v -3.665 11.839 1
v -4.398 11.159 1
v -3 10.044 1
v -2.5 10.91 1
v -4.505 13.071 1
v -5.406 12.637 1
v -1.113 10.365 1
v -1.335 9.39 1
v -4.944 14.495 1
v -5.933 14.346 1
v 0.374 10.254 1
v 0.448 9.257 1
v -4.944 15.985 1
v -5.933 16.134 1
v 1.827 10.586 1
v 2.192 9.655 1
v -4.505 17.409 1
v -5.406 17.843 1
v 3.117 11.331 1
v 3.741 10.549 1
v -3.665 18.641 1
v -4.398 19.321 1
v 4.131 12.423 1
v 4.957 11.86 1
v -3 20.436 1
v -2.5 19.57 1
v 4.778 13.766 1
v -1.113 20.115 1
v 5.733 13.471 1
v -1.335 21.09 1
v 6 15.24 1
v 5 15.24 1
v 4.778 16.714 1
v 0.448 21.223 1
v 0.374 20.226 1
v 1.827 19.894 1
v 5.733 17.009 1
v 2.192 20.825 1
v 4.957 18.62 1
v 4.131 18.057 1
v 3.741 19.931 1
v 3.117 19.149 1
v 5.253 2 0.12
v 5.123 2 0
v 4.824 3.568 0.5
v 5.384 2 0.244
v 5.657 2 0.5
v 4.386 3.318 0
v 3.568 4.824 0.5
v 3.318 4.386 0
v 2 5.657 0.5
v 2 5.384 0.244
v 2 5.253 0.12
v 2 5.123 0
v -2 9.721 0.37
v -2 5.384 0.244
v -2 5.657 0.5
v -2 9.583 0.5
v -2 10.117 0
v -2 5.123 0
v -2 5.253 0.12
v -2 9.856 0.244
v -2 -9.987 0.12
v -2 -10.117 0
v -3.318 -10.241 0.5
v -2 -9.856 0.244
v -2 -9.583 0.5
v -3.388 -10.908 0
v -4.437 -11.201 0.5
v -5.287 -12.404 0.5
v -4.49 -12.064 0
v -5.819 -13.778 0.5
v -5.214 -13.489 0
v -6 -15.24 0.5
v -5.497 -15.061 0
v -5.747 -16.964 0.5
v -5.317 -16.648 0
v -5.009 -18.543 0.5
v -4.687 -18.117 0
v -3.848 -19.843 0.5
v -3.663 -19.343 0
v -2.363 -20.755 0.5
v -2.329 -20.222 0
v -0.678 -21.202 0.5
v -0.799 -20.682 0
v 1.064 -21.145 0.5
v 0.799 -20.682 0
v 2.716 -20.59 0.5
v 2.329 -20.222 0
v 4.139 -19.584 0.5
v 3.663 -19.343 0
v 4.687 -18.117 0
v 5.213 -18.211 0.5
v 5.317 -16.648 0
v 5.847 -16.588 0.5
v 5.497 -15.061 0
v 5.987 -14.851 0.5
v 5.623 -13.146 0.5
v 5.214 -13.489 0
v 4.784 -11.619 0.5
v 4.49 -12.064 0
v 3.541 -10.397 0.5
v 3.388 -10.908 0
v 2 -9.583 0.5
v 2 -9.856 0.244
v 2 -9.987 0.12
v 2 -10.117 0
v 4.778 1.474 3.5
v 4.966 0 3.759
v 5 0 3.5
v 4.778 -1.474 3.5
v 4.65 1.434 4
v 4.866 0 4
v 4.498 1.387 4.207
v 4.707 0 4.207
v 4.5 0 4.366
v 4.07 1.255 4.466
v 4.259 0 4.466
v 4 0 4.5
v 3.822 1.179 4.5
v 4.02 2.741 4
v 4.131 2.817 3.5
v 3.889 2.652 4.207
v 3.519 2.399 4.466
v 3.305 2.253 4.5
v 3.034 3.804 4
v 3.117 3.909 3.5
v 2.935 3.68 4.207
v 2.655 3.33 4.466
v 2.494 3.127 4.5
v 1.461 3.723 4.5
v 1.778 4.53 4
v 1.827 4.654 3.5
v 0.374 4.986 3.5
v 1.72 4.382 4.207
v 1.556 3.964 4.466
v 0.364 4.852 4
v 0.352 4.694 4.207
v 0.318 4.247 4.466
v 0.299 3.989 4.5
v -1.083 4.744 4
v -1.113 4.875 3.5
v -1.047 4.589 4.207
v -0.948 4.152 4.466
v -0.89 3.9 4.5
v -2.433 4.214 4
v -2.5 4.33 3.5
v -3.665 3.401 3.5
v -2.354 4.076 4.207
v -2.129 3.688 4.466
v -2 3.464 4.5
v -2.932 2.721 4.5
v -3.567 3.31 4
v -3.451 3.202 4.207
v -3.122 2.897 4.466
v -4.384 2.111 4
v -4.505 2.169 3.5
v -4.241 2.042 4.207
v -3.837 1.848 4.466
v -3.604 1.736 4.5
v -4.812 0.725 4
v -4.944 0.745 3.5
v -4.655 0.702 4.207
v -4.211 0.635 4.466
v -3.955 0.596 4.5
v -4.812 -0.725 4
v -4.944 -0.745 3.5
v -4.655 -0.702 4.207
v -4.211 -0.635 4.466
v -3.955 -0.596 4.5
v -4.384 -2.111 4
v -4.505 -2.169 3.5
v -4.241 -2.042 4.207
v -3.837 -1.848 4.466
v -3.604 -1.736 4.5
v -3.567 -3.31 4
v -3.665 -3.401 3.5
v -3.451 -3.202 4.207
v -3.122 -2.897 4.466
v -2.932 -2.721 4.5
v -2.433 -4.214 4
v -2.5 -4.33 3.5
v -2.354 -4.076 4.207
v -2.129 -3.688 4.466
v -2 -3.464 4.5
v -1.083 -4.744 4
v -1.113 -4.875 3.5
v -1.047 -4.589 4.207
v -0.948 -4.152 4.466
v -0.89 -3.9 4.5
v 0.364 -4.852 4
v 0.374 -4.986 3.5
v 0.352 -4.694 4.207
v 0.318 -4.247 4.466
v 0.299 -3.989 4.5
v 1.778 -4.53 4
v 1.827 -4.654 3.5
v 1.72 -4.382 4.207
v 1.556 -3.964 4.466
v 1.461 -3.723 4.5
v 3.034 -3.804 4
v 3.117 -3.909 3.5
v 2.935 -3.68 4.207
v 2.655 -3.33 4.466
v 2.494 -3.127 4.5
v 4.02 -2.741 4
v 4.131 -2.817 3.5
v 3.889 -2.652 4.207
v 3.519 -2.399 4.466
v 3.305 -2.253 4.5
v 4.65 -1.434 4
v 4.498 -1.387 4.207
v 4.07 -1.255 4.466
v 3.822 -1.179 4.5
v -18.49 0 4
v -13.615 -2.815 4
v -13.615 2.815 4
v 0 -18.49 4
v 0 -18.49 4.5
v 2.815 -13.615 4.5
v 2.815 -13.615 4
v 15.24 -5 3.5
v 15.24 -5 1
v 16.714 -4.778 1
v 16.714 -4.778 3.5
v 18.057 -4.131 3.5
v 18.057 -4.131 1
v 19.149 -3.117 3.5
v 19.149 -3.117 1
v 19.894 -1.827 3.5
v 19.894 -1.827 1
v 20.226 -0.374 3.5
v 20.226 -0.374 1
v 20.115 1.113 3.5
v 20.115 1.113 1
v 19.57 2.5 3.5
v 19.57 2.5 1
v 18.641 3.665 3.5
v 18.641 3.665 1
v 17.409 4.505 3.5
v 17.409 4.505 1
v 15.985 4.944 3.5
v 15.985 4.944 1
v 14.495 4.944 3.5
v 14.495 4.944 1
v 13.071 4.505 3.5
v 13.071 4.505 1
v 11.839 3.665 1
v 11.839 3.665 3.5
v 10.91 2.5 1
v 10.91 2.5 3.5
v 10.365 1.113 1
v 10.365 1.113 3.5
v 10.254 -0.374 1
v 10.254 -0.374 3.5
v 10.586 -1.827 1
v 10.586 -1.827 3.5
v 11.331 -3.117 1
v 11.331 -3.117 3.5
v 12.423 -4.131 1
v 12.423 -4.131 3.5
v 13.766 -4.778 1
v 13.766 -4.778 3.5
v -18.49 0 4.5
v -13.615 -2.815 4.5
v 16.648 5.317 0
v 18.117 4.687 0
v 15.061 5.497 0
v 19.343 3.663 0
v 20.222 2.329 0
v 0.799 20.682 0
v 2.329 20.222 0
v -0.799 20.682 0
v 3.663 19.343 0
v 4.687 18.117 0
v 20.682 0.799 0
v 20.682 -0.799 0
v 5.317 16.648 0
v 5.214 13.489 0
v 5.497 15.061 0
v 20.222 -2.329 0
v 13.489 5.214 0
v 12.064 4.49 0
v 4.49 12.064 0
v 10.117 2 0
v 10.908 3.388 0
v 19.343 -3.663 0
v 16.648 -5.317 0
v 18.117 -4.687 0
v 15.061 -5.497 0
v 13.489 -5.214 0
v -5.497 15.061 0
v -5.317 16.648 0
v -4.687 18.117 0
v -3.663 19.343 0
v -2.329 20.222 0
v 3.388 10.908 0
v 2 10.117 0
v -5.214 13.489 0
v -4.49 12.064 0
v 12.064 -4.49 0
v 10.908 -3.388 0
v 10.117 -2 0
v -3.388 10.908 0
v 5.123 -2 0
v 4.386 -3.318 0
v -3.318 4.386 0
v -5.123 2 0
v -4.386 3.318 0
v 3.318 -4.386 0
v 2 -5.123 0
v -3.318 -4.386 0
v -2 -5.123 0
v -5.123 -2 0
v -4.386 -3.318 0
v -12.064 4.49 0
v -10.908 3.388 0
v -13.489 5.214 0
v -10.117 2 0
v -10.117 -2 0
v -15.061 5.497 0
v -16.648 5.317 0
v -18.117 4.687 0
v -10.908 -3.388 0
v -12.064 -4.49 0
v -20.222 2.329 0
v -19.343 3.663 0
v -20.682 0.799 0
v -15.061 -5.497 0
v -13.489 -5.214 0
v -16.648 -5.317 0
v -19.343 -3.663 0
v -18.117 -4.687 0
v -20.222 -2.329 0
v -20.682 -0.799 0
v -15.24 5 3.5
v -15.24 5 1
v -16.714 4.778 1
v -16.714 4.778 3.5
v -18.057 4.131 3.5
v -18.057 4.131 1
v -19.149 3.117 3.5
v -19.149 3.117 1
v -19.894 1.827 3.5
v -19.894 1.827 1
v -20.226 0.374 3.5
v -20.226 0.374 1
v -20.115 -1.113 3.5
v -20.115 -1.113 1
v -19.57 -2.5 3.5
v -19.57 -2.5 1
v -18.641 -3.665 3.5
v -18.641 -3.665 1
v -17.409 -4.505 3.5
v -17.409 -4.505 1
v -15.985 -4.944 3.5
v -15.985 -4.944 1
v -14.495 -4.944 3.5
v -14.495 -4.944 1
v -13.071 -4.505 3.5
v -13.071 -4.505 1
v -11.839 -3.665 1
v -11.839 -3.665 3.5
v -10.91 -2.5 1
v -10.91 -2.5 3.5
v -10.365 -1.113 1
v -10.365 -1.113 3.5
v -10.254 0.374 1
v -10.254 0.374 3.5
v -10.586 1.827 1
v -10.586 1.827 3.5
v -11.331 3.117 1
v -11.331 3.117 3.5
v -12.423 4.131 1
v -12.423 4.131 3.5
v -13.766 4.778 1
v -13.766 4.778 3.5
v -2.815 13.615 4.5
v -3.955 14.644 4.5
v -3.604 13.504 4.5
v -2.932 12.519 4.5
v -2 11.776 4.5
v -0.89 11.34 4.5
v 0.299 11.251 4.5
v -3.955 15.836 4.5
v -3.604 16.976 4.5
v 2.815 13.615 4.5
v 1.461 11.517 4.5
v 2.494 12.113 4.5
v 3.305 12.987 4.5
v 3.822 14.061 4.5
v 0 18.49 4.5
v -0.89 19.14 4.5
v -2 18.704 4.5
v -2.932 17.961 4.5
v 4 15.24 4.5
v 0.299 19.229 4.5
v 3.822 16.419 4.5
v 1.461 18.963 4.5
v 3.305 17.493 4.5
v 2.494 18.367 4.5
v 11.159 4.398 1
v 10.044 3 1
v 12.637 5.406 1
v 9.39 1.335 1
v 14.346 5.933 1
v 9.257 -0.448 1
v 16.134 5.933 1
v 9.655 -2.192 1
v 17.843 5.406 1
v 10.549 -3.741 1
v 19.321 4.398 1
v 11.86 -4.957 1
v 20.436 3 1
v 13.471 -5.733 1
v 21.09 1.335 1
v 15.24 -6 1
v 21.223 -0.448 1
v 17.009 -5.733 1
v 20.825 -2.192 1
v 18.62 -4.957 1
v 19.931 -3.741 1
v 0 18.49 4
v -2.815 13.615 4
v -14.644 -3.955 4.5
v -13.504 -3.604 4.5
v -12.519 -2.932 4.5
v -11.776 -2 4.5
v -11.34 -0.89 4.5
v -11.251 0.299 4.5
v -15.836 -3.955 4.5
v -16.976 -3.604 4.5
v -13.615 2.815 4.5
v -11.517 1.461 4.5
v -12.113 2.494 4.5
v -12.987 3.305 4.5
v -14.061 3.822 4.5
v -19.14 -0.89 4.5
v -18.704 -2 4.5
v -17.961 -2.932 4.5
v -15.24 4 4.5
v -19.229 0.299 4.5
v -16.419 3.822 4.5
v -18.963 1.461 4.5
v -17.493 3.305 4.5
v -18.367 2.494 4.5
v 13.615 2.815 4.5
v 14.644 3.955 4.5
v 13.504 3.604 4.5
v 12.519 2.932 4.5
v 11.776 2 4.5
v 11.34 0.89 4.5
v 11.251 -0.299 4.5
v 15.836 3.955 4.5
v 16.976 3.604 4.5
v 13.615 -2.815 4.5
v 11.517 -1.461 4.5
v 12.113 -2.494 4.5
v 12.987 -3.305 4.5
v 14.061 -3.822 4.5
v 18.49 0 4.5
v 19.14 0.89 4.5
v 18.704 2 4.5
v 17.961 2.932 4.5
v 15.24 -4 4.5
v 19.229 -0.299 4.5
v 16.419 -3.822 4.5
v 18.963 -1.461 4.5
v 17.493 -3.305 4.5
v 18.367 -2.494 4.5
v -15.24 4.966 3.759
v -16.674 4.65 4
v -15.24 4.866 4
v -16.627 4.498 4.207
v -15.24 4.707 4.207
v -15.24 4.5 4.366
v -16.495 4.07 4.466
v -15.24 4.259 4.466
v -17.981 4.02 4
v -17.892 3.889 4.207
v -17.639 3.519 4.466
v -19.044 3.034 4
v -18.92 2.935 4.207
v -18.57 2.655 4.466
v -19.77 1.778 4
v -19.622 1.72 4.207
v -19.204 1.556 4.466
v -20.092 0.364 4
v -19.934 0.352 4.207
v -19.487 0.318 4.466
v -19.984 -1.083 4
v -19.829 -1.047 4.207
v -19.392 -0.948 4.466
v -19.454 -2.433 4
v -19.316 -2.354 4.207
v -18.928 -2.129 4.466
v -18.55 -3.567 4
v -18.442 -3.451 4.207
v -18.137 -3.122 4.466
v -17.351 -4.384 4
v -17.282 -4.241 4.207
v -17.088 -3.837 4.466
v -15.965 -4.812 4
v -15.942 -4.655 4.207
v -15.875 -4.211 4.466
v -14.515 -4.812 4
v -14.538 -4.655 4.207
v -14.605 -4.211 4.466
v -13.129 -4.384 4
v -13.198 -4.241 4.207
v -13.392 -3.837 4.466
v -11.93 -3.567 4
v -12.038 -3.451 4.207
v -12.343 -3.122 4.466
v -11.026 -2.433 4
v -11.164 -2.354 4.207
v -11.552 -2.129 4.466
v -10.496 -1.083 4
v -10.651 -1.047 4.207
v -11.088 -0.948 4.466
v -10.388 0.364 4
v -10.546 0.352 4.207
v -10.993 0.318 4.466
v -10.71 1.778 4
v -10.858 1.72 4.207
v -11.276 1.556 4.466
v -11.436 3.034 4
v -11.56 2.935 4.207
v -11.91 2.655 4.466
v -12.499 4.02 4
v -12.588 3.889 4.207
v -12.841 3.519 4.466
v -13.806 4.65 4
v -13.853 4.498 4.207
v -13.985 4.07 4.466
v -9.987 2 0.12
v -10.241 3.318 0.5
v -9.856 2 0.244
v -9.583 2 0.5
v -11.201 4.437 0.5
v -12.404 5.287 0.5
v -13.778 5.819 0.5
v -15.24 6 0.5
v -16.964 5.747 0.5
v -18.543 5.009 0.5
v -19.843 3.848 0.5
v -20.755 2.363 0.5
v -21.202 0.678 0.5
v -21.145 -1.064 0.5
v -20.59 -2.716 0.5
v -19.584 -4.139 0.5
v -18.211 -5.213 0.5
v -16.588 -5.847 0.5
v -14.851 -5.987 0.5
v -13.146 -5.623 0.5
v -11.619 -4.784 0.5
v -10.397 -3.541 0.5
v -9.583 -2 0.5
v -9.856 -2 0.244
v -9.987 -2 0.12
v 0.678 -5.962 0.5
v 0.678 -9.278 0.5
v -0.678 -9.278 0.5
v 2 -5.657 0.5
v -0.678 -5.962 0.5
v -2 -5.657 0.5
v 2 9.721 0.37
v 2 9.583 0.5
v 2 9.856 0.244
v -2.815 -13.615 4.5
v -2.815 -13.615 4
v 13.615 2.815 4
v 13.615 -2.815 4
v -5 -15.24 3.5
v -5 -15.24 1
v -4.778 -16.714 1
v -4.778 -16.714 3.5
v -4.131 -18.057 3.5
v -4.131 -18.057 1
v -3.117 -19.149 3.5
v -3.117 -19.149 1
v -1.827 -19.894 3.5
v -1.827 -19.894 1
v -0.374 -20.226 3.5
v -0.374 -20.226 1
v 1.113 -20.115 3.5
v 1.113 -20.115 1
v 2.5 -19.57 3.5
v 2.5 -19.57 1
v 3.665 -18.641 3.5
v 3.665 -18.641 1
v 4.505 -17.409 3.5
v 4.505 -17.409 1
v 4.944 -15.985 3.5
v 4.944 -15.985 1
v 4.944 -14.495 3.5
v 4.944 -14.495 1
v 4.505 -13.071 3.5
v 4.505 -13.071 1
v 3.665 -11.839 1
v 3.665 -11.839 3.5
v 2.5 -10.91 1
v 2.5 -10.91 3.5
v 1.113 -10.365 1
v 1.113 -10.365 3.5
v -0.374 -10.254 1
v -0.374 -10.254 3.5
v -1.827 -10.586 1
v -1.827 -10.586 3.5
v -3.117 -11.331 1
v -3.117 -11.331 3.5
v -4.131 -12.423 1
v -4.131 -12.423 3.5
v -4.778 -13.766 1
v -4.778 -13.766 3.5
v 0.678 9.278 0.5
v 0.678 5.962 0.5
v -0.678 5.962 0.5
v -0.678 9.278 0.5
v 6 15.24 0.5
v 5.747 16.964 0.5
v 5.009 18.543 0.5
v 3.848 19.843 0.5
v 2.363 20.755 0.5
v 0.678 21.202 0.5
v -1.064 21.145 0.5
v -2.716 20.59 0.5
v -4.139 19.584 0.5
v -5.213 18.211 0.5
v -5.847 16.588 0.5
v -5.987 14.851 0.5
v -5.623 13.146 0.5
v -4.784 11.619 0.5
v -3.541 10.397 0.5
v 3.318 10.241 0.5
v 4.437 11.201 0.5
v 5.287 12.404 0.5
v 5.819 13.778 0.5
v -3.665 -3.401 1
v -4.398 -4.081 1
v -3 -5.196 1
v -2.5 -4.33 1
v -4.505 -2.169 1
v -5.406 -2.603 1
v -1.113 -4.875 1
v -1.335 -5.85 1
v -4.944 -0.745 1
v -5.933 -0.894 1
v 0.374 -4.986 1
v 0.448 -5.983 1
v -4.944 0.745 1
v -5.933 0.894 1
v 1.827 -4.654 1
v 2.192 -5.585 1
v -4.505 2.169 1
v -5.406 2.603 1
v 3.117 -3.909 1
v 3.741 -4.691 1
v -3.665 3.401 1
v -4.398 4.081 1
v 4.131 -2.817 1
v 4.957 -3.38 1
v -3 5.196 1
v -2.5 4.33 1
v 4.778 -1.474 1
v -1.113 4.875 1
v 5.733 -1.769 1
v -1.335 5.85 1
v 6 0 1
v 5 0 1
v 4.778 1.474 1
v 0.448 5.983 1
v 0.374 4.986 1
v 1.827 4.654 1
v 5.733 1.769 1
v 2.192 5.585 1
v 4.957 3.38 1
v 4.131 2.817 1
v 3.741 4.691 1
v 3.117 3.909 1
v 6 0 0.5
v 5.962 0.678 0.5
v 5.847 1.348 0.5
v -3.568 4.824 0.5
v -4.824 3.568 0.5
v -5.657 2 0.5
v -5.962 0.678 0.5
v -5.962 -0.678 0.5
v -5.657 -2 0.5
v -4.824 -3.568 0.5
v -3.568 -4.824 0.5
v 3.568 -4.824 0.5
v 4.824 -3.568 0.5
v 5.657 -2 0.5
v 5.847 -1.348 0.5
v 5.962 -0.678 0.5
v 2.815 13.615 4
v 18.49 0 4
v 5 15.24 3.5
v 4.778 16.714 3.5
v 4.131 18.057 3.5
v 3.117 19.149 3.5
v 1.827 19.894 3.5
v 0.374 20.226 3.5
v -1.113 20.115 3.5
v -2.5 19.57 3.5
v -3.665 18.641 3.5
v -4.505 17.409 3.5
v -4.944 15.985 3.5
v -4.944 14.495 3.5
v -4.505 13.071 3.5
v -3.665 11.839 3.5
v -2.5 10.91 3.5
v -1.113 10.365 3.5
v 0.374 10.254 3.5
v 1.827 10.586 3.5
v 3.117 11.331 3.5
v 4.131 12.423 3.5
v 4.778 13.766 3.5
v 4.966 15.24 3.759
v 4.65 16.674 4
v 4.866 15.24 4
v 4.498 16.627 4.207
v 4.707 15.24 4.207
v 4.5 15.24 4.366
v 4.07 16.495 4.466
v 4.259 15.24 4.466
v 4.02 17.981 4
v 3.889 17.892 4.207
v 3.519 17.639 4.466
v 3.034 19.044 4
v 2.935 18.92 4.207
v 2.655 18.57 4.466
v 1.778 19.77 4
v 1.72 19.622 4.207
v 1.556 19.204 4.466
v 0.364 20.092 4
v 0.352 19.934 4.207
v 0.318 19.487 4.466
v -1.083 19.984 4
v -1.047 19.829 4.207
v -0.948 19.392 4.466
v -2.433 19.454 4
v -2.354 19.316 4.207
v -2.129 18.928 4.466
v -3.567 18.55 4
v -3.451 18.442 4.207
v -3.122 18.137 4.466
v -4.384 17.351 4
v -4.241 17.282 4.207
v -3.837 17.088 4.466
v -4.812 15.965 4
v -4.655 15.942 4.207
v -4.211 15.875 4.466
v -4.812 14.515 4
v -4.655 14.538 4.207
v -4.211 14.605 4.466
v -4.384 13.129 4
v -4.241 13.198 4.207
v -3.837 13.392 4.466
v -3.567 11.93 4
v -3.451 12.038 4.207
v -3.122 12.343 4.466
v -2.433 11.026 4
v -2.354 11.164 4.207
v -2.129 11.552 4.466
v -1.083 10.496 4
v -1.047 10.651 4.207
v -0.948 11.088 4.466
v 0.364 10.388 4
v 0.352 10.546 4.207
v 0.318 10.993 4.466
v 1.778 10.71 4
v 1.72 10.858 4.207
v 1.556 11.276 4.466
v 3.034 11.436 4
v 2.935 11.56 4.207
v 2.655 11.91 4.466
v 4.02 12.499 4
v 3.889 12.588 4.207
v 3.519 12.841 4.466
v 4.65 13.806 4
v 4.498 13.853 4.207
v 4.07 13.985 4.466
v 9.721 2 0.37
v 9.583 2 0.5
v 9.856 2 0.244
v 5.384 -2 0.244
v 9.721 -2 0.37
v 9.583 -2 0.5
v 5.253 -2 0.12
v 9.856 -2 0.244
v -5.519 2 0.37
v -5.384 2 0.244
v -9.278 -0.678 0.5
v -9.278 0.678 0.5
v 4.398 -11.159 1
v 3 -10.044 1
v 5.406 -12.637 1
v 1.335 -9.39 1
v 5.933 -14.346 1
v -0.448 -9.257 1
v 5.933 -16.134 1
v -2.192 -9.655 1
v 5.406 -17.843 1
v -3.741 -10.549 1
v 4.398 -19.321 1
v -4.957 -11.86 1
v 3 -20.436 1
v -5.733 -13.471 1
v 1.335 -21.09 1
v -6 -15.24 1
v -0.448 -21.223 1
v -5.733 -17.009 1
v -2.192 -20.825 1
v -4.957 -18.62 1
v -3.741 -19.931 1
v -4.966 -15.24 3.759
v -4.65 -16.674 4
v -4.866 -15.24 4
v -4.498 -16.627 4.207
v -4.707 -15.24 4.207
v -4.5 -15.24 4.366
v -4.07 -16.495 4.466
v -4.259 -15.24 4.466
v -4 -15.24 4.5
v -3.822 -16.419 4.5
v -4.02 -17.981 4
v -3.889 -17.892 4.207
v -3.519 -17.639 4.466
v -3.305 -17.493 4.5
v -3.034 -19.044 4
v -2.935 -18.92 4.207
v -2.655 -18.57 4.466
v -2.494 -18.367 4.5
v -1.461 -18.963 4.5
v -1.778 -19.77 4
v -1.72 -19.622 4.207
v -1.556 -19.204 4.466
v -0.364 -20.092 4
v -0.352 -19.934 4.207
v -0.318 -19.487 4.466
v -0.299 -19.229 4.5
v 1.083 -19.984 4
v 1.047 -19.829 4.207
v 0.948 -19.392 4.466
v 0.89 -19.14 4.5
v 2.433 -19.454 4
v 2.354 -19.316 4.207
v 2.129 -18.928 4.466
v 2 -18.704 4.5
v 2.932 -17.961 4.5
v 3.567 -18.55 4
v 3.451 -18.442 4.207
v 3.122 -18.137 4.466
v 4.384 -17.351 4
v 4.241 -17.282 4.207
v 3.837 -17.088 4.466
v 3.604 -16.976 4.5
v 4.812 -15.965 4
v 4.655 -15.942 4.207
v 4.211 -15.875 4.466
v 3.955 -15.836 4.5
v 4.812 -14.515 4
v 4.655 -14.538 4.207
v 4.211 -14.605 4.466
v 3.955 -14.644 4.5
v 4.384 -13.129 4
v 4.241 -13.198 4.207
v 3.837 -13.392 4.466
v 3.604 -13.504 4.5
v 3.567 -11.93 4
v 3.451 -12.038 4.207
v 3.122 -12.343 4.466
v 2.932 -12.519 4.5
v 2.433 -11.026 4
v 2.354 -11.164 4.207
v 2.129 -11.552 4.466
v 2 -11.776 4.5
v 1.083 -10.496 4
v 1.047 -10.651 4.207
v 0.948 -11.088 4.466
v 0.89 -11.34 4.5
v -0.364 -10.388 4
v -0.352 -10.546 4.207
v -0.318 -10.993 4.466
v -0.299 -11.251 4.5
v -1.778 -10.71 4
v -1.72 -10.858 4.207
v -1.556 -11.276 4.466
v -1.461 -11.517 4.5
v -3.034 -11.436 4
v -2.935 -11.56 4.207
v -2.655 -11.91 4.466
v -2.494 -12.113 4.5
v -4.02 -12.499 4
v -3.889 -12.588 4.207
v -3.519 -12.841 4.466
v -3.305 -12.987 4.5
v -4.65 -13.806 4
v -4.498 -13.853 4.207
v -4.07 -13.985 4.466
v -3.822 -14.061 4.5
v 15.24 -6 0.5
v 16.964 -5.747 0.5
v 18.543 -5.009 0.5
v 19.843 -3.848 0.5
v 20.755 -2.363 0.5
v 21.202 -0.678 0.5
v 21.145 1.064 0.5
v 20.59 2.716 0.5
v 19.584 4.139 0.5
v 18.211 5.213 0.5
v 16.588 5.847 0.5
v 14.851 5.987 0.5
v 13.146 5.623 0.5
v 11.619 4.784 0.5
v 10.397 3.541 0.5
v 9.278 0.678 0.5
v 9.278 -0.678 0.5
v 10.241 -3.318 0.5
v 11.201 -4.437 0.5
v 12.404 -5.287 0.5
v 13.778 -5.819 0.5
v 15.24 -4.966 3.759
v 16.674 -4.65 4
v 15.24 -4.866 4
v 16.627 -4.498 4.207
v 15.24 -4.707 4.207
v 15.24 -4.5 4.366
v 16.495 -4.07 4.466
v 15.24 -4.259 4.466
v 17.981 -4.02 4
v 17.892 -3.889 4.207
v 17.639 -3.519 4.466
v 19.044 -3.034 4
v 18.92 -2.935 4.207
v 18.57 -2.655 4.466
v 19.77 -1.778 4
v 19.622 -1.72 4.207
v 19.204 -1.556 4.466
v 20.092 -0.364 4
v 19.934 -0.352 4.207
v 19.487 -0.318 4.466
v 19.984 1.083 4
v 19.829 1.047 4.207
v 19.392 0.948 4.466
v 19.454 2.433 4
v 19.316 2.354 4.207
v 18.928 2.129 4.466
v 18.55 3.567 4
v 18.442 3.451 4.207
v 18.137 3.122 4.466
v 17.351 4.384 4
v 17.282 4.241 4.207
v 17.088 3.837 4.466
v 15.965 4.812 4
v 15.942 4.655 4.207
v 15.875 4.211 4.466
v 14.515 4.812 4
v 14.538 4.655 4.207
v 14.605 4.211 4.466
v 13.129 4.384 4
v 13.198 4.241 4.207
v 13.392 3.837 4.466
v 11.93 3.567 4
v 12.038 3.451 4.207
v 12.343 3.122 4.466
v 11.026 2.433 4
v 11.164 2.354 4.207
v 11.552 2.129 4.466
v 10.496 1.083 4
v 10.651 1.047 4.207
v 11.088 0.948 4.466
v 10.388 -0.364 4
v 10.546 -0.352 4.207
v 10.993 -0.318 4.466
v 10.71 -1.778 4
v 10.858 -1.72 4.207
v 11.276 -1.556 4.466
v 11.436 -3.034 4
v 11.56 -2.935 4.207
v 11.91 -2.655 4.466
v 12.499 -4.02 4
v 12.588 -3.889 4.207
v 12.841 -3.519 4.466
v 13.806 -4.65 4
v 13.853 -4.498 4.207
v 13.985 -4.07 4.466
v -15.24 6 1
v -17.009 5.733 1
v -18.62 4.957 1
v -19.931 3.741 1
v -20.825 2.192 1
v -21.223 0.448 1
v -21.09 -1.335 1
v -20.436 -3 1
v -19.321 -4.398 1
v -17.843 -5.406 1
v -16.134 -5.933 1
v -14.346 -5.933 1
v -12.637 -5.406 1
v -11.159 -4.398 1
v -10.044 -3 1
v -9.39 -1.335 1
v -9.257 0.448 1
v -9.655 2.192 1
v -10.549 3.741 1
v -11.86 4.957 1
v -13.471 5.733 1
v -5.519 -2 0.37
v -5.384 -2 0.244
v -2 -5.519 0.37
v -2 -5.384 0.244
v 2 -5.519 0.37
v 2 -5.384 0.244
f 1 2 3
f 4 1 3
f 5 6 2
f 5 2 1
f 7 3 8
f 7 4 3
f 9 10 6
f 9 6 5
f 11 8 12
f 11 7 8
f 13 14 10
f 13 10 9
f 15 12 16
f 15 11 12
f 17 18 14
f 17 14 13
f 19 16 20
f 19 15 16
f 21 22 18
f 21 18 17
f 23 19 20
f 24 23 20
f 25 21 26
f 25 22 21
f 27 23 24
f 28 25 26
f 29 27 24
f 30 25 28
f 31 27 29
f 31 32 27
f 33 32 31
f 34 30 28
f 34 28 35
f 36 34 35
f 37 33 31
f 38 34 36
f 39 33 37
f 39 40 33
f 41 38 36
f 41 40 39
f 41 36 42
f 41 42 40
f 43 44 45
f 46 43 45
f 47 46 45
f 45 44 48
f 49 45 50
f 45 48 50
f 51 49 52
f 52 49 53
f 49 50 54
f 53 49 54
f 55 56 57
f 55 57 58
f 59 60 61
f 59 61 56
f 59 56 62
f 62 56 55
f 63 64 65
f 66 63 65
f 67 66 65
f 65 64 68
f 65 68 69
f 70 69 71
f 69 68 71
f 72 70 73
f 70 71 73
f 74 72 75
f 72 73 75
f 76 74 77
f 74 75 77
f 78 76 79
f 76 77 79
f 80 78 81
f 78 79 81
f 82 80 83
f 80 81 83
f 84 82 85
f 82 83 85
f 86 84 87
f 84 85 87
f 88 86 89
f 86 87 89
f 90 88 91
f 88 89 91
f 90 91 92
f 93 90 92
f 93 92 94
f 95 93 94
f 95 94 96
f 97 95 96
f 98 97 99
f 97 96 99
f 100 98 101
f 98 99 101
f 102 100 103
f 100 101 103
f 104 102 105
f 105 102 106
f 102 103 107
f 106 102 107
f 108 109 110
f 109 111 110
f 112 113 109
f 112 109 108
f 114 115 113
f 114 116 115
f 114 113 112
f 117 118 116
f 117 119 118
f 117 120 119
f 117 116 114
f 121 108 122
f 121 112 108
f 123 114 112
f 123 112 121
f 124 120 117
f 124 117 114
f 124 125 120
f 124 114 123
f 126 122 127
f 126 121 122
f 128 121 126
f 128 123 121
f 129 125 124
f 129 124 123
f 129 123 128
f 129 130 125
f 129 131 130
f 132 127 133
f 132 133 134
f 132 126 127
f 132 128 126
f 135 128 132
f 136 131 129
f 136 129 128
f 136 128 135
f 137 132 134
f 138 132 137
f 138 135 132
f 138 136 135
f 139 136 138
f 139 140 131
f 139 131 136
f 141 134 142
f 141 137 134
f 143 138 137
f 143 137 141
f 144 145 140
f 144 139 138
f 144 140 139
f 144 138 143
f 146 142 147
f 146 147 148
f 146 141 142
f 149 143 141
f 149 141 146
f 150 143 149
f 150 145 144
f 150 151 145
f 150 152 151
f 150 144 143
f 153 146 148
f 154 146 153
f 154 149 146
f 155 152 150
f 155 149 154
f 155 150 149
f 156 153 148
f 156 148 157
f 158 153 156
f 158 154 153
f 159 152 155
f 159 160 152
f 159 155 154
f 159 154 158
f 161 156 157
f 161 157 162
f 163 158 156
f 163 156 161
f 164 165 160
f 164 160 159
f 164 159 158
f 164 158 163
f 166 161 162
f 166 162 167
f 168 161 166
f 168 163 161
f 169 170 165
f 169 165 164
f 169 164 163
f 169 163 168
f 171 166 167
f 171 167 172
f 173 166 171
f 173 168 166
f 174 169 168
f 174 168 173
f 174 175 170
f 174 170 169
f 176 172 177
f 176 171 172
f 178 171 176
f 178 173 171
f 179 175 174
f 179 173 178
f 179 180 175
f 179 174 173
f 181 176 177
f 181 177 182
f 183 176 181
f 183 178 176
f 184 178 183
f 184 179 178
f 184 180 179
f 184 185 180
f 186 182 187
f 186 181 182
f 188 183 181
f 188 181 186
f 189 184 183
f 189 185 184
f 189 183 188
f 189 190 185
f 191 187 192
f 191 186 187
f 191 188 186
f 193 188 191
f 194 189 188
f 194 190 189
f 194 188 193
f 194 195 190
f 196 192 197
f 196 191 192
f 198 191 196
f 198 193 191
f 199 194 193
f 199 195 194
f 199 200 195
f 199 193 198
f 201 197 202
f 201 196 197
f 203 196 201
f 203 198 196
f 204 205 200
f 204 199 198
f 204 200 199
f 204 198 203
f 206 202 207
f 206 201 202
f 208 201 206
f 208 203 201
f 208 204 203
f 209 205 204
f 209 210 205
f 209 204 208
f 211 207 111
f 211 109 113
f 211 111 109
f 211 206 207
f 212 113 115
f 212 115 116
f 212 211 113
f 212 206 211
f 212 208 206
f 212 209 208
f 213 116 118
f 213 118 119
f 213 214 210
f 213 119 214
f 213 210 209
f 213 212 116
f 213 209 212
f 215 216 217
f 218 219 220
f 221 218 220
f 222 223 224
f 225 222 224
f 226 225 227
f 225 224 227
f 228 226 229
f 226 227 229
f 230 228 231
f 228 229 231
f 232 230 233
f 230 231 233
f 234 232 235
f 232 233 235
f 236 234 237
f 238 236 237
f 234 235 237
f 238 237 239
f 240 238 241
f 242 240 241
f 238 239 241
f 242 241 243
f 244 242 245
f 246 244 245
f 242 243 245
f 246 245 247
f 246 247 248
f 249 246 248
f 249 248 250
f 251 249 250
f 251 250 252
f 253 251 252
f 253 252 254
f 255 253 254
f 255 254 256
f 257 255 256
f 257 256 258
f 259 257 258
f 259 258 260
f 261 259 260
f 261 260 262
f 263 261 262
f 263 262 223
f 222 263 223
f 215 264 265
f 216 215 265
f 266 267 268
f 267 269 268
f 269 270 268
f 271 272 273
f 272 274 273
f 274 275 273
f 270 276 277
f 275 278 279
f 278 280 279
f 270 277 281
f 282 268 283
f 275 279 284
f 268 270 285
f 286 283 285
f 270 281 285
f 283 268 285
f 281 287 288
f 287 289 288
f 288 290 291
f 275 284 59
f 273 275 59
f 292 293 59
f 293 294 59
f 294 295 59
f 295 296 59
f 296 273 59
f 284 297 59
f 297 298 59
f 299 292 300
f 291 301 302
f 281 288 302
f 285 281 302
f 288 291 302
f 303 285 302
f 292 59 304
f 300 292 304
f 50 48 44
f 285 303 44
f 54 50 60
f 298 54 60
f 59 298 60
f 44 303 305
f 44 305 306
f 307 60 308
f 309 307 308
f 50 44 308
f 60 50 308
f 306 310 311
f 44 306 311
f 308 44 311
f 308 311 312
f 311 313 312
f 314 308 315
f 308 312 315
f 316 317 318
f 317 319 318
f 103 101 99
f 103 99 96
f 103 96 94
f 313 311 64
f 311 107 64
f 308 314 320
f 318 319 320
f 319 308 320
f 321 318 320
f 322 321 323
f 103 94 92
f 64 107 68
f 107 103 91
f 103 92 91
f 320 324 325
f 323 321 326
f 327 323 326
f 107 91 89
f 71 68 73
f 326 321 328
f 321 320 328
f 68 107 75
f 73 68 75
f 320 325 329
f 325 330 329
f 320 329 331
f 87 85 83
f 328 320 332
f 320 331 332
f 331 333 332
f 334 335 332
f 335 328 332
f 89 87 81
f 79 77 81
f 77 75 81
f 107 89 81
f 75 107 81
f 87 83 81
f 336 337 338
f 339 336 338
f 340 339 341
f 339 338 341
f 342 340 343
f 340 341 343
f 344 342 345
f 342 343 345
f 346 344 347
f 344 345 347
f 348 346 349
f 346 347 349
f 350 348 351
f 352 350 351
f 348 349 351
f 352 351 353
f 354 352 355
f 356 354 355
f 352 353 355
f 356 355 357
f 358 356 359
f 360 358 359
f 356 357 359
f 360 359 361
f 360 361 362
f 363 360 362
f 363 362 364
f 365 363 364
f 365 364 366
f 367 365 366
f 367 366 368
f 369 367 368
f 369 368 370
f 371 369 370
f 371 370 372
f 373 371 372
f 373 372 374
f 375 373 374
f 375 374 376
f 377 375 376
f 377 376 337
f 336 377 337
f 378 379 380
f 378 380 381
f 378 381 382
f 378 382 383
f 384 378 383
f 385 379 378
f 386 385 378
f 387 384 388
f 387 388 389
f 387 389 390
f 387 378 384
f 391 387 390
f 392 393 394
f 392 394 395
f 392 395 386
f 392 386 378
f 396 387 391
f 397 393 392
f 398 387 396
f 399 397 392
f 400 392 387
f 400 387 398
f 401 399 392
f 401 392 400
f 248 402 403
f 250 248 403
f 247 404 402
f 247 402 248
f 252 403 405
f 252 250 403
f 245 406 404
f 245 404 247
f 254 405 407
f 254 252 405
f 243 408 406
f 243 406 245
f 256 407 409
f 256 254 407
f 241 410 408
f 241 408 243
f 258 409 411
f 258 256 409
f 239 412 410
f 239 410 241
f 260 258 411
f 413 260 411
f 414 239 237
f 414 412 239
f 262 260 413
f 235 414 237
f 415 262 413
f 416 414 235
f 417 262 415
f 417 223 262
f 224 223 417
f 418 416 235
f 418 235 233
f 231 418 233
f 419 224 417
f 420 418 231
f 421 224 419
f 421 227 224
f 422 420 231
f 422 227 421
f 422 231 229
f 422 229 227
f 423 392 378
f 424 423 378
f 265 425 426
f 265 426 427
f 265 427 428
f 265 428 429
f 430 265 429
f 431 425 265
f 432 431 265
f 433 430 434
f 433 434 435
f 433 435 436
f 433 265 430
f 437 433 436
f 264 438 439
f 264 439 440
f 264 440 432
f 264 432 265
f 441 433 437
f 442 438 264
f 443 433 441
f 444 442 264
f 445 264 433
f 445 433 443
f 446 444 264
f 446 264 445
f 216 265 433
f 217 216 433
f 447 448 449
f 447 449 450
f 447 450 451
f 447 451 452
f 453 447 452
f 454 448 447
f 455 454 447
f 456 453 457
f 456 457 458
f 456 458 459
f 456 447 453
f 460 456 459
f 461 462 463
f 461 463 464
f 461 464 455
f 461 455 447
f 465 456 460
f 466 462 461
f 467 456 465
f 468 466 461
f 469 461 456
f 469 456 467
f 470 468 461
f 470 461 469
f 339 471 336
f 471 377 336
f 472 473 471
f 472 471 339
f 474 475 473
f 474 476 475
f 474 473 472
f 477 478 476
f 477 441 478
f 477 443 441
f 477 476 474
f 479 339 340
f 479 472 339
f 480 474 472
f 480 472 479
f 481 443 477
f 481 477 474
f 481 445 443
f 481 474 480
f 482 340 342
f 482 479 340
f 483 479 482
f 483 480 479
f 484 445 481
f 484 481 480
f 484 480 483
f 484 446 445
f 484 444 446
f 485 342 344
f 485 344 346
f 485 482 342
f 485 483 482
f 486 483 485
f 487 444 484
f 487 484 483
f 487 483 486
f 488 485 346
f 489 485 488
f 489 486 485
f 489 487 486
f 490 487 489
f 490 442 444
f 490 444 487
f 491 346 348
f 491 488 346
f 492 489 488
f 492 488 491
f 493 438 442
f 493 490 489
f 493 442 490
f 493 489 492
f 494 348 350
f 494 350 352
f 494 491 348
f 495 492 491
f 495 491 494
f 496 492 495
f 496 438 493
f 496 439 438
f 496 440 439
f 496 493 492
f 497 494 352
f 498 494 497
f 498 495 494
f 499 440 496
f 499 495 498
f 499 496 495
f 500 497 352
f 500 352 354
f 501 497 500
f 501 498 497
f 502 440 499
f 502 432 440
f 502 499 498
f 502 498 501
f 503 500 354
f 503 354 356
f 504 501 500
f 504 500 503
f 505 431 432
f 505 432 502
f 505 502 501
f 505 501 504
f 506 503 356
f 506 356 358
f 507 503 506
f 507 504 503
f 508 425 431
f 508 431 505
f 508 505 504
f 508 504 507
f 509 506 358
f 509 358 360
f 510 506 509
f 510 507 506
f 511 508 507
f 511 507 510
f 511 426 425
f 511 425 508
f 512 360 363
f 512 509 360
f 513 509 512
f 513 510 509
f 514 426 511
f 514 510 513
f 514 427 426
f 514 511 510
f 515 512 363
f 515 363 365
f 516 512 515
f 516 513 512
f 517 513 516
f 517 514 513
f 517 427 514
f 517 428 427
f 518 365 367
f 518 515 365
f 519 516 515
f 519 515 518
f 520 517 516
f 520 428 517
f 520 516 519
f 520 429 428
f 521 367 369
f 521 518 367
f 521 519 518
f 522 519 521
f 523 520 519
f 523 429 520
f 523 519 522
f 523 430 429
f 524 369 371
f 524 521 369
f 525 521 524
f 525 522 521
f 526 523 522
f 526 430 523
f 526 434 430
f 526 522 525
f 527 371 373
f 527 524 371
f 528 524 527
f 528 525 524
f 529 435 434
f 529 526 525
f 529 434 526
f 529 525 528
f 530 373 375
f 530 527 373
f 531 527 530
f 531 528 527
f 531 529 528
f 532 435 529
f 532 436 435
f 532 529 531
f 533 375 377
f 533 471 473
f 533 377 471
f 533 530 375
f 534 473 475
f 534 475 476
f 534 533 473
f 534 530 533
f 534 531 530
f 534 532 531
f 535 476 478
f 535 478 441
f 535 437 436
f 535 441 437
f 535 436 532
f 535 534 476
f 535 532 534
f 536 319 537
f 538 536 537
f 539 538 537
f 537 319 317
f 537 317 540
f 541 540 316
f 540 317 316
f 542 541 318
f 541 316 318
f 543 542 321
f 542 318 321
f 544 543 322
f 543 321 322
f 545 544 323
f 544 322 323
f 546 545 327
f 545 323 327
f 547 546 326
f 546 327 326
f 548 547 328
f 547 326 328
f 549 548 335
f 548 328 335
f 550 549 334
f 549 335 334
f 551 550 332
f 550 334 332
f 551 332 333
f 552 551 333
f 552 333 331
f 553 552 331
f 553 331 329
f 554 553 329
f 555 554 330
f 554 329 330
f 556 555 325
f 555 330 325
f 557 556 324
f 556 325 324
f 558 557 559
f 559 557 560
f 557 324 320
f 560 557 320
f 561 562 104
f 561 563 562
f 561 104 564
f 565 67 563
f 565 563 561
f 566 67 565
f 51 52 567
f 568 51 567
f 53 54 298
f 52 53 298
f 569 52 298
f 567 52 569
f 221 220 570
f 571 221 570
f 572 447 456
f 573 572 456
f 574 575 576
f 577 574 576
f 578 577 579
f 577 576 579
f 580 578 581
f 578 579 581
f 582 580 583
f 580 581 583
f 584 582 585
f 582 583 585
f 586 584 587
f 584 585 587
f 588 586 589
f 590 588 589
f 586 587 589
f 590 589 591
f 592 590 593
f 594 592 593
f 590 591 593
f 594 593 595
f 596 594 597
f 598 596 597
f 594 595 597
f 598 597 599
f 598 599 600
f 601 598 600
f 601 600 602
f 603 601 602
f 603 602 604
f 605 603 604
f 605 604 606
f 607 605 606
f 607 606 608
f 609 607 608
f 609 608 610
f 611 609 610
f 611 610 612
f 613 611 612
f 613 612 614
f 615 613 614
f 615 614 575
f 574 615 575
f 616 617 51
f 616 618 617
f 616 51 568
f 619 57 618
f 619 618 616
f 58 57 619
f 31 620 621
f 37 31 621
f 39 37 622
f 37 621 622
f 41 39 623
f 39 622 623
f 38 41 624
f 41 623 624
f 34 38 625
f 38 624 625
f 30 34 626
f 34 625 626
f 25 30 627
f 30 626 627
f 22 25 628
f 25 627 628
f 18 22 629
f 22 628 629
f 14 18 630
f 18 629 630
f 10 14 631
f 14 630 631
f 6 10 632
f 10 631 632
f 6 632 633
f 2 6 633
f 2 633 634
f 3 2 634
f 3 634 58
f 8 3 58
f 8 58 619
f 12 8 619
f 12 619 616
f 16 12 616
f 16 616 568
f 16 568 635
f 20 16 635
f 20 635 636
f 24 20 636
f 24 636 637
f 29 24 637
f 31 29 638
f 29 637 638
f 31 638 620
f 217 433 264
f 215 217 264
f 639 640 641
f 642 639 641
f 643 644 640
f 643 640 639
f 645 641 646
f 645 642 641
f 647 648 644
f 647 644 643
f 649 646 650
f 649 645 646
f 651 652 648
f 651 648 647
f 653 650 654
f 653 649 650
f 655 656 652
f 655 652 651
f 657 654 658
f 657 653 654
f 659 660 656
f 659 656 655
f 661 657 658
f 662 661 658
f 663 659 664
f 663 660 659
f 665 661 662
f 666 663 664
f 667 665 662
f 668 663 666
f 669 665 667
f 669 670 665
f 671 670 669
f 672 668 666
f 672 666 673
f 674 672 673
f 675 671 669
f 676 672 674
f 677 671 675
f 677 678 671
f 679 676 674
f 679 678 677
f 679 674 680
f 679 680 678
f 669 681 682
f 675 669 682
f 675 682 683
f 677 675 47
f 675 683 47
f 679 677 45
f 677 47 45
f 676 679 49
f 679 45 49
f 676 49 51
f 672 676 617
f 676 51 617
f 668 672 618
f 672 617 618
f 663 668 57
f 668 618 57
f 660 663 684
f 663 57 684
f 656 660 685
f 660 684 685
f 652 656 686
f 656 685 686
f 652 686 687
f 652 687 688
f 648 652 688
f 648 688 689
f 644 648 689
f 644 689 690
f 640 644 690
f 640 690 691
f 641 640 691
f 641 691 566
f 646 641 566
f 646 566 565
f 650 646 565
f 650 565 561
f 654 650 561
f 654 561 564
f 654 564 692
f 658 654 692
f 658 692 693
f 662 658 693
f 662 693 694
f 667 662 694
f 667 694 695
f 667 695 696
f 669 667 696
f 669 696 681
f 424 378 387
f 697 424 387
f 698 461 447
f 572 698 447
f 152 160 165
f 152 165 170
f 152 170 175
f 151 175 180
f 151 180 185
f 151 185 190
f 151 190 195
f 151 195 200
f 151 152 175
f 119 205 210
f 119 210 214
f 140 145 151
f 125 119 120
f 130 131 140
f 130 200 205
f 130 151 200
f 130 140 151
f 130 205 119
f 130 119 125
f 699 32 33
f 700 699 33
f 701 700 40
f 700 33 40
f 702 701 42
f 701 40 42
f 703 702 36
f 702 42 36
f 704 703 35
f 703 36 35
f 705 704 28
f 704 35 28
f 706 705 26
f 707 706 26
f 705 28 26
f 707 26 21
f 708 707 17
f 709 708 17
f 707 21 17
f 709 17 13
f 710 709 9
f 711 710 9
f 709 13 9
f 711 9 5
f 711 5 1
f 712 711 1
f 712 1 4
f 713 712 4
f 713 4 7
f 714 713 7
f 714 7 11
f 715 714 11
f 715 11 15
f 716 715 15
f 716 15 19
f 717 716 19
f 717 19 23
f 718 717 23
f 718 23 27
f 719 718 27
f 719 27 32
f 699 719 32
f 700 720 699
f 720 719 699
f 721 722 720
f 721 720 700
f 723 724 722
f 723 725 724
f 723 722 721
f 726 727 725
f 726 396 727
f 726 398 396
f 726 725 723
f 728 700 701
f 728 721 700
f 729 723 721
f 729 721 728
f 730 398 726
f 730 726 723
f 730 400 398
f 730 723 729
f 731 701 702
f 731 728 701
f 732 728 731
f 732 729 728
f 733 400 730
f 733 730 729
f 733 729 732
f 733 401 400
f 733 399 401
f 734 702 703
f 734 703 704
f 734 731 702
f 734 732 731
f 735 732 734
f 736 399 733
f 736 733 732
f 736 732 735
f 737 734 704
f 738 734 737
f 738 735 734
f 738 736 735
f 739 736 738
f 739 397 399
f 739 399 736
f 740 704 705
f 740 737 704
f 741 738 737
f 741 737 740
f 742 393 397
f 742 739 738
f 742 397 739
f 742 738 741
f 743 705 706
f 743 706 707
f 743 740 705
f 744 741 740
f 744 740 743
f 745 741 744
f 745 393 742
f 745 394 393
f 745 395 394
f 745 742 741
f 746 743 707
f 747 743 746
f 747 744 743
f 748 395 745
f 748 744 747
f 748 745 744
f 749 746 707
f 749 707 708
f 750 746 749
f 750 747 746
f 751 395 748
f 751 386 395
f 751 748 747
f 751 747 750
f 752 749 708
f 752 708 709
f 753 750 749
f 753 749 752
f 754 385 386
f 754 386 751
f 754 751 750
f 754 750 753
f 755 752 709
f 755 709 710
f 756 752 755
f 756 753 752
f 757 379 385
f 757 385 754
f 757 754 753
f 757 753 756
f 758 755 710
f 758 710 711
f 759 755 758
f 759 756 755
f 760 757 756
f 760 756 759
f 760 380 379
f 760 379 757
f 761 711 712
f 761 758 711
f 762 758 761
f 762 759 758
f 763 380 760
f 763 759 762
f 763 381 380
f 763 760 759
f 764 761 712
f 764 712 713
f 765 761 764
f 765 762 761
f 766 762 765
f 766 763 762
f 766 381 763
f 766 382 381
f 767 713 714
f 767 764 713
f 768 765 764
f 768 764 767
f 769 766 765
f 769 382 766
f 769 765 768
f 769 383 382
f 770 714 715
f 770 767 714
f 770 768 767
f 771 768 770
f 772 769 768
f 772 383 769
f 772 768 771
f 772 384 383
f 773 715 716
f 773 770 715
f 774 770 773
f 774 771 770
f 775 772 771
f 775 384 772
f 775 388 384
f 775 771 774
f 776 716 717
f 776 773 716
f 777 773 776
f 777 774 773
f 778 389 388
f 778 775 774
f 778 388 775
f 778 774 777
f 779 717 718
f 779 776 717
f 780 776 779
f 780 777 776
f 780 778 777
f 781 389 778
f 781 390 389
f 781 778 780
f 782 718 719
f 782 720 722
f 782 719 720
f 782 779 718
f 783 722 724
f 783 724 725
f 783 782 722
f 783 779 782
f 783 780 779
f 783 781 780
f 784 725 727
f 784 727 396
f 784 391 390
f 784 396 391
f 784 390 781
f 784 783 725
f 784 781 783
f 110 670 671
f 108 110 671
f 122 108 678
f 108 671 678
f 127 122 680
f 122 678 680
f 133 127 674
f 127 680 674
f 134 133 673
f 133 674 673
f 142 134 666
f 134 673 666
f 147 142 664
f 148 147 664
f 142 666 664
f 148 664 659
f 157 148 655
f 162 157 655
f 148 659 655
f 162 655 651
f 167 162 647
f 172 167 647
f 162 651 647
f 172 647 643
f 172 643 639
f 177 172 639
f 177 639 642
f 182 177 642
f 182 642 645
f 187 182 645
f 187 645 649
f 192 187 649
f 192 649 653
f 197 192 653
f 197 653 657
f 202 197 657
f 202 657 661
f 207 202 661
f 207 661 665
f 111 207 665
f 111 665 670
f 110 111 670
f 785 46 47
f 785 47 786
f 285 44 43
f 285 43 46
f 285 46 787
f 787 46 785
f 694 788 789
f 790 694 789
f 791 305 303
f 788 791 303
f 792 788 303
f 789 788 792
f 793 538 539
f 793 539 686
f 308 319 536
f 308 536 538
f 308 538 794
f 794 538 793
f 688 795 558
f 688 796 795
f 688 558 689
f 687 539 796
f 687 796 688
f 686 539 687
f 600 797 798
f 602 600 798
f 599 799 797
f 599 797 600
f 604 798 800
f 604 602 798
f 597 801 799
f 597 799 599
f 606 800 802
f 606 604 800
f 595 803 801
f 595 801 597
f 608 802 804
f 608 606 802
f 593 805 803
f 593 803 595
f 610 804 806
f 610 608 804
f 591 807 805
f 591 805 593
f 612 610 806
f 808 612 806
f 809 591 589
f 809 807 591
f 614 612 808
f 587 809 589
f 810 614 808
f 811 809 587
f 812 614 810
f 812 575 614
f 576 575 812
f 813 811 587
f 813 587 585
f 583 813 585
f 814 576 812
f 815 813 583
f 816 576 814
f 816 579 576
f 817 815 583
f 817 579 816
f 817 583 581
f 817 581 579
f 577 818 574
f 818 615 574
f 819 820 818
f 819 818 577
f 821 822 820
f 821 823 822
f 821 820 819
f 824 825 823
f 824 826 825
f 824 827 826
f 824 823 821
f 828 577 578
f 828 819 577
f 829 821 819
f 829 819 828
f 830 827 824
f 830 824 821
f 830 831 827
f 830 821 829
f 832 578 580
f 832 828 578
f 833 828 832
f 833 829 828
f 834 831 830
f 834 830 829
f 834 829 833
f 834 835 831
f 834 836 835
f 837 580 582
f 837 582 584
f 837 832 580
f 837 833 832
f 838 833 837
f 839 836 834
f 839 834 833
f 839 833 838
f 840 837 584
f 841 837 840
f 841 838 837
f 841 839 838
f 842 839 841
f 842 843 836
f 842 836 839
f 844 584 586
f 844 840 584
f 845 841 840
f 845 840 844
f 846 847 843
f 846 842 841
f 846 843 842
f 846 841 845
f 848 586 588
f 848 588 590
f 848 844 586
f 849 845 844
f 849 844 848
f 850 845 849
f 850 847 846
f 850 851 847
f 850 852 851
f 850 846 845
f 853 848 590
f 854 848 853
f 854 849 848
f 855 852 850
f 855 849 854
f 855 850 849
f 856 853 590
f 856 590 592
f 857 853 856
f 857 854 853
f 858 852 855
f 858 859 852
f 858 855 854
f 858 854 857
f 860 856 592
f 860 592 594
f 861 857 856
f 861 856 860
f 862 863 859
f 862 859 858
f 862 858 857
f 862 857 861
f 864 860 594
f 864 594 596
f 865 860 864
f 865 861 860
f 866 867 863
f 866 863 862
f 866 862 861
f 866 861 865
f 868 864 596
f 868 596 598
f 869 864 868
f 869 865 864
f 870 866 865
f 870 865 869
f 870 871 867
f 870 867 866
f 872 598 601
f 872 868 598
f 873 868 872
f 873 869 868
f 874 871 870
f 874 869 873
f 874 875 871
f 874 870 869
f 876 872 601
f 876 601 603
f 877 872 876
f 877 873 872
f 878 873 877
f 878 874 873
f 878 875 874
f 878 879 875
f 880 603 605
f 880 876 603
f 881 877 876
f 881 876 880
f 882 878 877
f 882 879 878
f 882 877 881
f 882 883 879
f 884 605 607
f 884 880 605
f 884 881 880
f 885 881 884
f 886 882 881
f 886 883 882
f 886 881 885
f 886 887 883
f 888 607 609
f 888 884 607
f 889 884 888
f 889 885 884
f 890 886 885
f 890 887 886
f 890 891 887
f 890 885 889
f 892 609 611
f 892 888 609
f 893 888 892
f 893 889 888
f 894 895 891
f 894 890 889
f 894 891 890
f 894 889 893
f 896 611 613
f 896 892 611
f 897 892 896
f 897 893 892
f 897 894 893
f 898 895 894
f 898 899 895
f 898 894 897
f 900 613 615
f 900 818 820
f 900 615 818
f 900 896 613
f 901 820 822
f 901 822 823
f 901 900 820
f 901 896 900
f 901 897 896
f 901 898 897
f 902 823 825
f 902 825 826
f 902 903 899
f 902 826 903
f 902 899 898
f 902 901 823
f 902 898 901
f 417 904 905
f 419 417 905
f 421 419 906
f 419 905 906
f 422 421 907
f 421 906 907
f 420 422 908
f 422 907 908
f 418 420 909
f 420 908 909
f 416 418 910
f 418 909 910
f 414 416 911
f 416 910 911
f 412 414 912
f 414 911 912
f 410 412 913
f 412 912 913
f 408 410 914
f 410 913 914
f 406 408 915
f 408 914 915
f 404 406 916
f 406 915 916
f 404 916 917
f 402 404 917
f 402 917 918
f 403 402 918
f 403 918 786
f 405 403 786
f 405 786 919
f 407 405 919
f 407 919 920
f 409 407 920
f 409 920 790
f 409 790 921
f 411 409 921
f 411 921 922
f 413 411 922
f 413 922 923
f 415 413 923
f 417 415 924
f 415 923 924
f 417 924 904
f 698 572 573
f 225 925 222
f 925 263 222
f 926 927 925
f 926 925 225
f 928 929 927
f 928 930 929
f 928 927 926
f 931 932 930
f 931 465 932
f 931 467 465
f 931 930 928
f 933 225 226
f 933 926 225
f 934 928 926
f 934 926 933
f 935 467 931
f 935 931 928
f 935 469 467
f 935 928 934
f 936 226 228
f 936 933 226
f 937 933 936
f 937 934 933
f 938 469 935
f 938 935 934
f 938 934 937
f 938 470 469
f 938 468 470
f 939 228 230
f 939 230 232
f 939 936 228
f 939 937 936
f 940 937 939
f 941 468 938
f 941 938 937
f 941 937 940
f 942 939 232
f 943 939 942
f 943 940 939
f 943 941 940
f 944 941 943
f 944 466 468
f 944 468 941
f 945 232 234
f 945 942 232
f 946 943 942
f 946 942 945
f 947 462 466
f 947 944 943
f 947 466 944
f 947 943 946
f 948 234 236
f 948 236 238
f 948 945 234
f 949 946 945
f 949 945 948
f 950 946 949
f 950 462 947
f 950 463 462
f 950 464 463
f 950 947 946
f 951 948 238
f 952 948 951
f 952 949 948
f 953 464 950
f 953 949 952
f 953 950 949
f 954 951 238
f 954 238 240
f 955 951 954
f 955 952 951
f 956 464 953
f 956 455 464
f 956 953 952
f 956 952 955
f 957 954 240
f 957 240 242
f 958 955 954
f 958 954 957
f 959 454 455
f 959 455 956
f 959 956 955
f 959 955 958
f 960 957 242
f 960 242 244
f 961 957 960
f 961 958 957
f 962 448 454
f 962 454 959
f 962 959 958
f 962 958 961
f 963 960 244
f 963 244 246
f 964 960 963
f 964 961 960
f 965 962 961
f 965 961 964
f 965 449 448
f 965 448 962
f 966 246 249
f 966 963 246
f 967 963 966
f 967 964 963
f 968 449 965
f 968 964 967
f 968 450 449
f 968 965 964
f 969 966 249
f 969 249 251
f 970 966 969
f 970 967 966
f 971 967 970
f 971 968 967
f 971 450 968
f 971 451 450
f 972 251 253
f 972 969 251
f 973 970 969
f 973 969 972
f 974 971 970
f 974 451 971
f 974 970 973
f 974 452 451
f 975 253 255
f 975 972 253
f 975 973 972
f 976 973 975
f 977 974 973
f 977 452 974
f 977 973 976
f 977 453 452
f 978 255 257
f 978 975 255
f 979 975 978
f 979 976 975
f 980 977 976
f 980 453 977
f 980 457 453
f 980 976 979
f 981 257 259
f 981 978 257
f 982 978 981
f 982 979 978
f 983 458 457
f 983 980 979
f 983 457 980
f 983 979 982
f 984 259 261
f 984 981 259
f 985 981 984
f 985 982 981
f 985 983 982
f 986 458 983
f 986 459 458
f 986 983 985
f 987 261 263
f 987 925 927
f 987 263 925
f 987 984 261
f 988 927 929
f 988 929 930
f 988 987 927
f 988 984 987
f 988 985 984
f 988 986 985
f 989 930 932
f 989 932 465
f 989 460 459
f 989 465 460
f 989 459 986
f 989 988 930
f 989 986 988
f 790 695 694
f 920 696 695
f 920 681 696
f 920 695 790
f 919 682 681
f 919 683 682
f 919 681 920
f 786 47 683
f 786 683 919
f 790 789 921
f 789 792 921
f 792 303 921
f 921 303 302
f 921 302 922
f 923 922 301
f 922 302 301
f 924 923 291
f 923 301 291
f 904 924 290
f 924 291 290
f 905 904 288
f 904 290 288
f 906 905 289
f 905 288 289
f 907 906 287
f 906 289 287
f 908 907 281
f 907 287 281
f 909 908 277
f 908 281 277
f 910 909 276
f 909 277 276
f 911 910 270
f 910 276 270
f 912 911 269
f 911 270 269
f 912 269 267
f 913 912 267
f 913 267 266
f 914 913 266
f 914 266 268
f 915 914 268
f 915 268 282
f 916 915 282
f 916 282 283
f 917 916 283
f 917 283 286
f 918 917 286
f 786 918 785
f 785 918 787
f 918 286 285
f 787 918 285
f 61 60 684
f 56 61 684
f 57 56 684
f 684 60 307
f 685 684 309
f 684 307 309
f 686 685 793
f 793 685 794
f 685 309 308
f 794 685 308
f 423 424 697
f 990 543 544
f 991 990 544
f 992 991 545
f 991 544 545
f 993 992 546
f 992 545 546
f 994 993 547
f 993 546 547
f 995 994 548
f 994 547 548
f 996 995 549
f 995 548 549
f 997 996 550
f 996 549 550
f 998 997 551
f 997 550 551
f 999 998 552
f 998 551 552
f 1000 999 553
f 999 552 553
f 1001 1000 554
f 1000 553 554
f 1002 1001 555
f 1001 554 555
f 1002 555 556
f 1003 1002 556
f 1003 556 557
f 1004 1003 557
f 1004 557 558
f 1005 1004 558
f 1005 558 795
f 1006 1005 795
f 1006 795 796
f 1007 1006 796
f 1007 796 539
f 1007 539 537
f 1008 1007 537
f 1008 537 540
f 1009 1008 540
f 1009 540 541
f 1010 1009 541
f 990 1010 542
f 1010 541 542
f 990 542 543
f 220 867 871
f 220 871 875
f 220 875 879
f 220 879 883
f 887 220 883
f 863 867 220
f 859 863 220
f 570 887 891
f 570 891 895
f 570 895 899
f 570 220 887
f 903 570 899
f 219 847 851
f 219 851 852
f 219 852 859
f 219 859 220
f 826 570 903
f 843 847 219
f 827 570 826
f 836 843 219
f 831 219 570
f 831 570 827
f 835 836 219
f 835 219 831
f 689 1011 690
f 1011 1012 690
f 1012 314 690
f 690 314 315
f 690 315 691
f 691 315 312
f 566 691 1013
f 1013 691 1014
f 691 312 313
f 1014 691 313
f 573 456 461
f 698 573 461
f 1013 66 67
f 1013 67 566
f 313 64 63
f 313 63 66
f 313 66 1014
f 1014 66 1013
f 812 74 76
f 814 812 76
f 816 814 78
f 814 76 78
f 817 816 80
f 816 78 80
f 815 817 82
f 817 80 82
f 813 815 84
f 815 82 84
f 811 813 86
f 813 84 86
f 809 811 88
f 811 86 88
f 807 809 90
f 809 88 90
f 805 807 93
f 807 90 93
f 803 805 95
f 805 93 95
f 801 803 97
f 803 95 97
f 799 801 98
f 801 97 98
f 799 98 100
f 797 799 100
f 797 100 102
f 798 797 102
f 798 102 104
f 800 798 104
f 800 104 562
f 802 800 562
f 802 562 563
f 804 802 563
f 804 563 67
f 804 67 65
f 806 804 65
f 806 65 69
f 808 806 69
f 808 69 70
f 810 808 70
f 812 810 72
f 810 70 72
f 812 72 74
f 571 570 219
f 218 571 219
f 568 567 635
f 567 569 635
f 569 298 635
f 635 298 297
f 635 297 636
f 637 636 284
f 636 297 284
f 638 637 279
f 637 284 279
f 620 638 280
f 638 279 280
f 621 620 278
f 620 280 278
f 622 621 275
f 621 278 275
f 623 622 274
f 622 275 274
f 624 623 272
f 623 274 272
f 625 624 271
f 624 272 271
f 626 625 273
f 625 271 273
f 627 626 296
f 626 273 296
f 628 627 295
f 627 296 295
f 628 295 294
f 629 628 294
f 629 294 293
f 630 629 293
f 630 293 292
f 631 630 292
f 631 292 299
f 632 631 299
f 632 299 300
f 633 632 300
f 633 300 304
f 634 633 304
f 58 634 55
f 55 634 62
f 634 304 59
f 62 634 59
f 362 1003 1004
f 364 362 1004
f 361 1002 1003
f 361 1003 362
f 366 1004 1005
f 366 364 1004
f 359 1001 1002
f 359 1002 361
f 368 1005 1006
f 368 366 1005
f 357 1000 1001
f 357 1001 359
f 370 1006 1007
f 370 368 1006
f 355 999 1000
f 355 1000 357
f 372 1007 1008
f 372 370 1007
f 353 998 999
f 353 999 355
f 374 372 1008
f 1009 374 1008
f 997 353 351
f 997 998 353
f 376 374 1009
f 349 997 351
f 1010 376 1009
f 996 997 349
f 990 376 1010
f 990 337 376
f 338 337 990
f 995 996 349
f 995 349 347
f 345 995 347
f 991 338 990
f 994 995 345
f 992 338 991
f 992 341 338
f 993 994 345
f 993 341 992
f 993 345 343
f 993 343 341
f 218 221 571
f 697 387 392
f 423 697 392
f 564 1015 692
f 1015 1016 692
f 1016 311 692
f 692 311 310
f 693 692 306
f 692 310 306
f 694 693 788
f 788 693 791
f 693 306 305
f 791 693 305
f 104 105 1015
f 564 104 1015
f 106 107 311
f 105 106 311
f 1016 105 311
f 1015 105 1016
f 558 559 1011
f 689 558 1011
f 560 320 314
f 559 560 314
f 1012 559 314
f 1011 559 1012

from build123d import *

# Parameters (mm, degrees)
CYLINDER_R             = 6
CYLINDER_DEPTH         = 1
CHAMFER_SIZE           = 0.5
CYLINDER001_R          = 5
CYLINDER001_DEPTH      = 4.5
FILLET_R               = 1
BOX_W                  = 30.48
BOX_H                  = 4
BOX_DEPTH              = 0.5
BOX001_W               = 30.48
BOX001_H               = 4
BOX001_DEPTH           = 0.5
BOX001_PLACEMENT_ANGLE = 90
ARRAY_COUNT            = 4
POCKET003_DEPTH        = 0.5
POLARPATTERN001_COUNT  = 4


with BuildPart() as chamfer_body:
    # Cylinder → Cylinder (new body)
    with BuildSketch(Plane.XY):
        Circle(CYLINDER_R)
    extrude(amount=CYLINDER_DEPTH)

    # Chamfer
    chamfer_edges = [chamfer_body.edges().sort_by_distance(p)[0] for p in [
        (-6, 0, 0),
    ]]
    chamfer(chamfer_edges, length=CHAMFER_SIZE)


with BuildPart() as fusion:
    # Cylinder001 → Cylinder001 (new body)
    with BuildSketch(Plane.XY):
        Circle(CYLINDER001_R)
    extrude(amount=CYLINDER001_DEPTH)

    # Fillet
    fillet_edges = [fusion.edges().sort_by_distance(p)[0] for p in [
        (-5, 0, 4.5),
    ]]
    fillet(fillet_edges, radius=FILLET_R)

    # Fusion: union Chamfer body
    add(chamfer_body.part)


with BuildPart() as cube:
    # Box → Box (new body)
    with BuildSketch(Plane(origin=(-15.24, -2, 0), x_dir=(1, 0, 0), z_dir=(0, 0, 1))):
        with Locations((15.24, 2)):
            Rectangle(BOX_W, BOX_H)
    extrude(amount=BOX_DEPTH)


with BuildPart() as cube001:
    # Box001 → Box001 (new body)
    with BuildSketch(Plane.XY):
        with Locations((15.24, 2)):
            Rectangle(BOX001_W, BOX001_H)
    extrude(amount=BOX001_DEPTH)


with BuildPart() as cube001_1:
    # Box001 placement: moved
    add(cube001.part.moved(Location((2, -15.24, 0))).rotate(Axis((2, -15.24, 0), (0, 0, 1)), BOX001_PLACEMENT_ANGLE))


with BuildPart() as polarpattern001:
    # Clone base: copy of Fusion
    add(fusion.part)


with BuildPart() as polarpattern001_1:
    # Clone placement: moved
    add(polarpattern001.part.moved(Location((0, 15.24, 0))))

    # Array: PolarPattern001 ×4 about axis
    array_axis = Axis((0, 0, 0), (0, 0, 1))


with BuildPart() as polarpattern001_2:
    add(polarpattern001_1.part)
    for i in range(1, ARRAY_COUNT):
        add(polarpattern001_1.part.rotate(array_axis, i * 360 / ARRAY_COUNT))

    # Fusion001: union Fusion, Cube, Cube001
    add(fusion.part)
    add(cube.part)
    add(cube001_1.part)

    # Sketch004 → Pocket003 (cut)
    with BuildSketch(Plane.XY.offset(4.5)):
        Polygon((0, 18.49), (-2.814583, 13.615), (2.814583, 13.615), align=None)
    pocket003 = extrude(amount=-POCKET003_DEPTH, mode=Mode.SUBTRACT)

    # PolarPattern001: Pocket003 ×4 about axis
    polarpattern001_axis = Axis((0, 0, 4.5), (0, 0, 1))
    for i in range(1, POLARPATTERN001_COUNT):
        add(pocket003.rotate(polarpattern001_axis, i * 360 / POLARPATTERN001_COUNT), mode=Mode.SUBTRACT)


solid = polarpattern001_2.part
